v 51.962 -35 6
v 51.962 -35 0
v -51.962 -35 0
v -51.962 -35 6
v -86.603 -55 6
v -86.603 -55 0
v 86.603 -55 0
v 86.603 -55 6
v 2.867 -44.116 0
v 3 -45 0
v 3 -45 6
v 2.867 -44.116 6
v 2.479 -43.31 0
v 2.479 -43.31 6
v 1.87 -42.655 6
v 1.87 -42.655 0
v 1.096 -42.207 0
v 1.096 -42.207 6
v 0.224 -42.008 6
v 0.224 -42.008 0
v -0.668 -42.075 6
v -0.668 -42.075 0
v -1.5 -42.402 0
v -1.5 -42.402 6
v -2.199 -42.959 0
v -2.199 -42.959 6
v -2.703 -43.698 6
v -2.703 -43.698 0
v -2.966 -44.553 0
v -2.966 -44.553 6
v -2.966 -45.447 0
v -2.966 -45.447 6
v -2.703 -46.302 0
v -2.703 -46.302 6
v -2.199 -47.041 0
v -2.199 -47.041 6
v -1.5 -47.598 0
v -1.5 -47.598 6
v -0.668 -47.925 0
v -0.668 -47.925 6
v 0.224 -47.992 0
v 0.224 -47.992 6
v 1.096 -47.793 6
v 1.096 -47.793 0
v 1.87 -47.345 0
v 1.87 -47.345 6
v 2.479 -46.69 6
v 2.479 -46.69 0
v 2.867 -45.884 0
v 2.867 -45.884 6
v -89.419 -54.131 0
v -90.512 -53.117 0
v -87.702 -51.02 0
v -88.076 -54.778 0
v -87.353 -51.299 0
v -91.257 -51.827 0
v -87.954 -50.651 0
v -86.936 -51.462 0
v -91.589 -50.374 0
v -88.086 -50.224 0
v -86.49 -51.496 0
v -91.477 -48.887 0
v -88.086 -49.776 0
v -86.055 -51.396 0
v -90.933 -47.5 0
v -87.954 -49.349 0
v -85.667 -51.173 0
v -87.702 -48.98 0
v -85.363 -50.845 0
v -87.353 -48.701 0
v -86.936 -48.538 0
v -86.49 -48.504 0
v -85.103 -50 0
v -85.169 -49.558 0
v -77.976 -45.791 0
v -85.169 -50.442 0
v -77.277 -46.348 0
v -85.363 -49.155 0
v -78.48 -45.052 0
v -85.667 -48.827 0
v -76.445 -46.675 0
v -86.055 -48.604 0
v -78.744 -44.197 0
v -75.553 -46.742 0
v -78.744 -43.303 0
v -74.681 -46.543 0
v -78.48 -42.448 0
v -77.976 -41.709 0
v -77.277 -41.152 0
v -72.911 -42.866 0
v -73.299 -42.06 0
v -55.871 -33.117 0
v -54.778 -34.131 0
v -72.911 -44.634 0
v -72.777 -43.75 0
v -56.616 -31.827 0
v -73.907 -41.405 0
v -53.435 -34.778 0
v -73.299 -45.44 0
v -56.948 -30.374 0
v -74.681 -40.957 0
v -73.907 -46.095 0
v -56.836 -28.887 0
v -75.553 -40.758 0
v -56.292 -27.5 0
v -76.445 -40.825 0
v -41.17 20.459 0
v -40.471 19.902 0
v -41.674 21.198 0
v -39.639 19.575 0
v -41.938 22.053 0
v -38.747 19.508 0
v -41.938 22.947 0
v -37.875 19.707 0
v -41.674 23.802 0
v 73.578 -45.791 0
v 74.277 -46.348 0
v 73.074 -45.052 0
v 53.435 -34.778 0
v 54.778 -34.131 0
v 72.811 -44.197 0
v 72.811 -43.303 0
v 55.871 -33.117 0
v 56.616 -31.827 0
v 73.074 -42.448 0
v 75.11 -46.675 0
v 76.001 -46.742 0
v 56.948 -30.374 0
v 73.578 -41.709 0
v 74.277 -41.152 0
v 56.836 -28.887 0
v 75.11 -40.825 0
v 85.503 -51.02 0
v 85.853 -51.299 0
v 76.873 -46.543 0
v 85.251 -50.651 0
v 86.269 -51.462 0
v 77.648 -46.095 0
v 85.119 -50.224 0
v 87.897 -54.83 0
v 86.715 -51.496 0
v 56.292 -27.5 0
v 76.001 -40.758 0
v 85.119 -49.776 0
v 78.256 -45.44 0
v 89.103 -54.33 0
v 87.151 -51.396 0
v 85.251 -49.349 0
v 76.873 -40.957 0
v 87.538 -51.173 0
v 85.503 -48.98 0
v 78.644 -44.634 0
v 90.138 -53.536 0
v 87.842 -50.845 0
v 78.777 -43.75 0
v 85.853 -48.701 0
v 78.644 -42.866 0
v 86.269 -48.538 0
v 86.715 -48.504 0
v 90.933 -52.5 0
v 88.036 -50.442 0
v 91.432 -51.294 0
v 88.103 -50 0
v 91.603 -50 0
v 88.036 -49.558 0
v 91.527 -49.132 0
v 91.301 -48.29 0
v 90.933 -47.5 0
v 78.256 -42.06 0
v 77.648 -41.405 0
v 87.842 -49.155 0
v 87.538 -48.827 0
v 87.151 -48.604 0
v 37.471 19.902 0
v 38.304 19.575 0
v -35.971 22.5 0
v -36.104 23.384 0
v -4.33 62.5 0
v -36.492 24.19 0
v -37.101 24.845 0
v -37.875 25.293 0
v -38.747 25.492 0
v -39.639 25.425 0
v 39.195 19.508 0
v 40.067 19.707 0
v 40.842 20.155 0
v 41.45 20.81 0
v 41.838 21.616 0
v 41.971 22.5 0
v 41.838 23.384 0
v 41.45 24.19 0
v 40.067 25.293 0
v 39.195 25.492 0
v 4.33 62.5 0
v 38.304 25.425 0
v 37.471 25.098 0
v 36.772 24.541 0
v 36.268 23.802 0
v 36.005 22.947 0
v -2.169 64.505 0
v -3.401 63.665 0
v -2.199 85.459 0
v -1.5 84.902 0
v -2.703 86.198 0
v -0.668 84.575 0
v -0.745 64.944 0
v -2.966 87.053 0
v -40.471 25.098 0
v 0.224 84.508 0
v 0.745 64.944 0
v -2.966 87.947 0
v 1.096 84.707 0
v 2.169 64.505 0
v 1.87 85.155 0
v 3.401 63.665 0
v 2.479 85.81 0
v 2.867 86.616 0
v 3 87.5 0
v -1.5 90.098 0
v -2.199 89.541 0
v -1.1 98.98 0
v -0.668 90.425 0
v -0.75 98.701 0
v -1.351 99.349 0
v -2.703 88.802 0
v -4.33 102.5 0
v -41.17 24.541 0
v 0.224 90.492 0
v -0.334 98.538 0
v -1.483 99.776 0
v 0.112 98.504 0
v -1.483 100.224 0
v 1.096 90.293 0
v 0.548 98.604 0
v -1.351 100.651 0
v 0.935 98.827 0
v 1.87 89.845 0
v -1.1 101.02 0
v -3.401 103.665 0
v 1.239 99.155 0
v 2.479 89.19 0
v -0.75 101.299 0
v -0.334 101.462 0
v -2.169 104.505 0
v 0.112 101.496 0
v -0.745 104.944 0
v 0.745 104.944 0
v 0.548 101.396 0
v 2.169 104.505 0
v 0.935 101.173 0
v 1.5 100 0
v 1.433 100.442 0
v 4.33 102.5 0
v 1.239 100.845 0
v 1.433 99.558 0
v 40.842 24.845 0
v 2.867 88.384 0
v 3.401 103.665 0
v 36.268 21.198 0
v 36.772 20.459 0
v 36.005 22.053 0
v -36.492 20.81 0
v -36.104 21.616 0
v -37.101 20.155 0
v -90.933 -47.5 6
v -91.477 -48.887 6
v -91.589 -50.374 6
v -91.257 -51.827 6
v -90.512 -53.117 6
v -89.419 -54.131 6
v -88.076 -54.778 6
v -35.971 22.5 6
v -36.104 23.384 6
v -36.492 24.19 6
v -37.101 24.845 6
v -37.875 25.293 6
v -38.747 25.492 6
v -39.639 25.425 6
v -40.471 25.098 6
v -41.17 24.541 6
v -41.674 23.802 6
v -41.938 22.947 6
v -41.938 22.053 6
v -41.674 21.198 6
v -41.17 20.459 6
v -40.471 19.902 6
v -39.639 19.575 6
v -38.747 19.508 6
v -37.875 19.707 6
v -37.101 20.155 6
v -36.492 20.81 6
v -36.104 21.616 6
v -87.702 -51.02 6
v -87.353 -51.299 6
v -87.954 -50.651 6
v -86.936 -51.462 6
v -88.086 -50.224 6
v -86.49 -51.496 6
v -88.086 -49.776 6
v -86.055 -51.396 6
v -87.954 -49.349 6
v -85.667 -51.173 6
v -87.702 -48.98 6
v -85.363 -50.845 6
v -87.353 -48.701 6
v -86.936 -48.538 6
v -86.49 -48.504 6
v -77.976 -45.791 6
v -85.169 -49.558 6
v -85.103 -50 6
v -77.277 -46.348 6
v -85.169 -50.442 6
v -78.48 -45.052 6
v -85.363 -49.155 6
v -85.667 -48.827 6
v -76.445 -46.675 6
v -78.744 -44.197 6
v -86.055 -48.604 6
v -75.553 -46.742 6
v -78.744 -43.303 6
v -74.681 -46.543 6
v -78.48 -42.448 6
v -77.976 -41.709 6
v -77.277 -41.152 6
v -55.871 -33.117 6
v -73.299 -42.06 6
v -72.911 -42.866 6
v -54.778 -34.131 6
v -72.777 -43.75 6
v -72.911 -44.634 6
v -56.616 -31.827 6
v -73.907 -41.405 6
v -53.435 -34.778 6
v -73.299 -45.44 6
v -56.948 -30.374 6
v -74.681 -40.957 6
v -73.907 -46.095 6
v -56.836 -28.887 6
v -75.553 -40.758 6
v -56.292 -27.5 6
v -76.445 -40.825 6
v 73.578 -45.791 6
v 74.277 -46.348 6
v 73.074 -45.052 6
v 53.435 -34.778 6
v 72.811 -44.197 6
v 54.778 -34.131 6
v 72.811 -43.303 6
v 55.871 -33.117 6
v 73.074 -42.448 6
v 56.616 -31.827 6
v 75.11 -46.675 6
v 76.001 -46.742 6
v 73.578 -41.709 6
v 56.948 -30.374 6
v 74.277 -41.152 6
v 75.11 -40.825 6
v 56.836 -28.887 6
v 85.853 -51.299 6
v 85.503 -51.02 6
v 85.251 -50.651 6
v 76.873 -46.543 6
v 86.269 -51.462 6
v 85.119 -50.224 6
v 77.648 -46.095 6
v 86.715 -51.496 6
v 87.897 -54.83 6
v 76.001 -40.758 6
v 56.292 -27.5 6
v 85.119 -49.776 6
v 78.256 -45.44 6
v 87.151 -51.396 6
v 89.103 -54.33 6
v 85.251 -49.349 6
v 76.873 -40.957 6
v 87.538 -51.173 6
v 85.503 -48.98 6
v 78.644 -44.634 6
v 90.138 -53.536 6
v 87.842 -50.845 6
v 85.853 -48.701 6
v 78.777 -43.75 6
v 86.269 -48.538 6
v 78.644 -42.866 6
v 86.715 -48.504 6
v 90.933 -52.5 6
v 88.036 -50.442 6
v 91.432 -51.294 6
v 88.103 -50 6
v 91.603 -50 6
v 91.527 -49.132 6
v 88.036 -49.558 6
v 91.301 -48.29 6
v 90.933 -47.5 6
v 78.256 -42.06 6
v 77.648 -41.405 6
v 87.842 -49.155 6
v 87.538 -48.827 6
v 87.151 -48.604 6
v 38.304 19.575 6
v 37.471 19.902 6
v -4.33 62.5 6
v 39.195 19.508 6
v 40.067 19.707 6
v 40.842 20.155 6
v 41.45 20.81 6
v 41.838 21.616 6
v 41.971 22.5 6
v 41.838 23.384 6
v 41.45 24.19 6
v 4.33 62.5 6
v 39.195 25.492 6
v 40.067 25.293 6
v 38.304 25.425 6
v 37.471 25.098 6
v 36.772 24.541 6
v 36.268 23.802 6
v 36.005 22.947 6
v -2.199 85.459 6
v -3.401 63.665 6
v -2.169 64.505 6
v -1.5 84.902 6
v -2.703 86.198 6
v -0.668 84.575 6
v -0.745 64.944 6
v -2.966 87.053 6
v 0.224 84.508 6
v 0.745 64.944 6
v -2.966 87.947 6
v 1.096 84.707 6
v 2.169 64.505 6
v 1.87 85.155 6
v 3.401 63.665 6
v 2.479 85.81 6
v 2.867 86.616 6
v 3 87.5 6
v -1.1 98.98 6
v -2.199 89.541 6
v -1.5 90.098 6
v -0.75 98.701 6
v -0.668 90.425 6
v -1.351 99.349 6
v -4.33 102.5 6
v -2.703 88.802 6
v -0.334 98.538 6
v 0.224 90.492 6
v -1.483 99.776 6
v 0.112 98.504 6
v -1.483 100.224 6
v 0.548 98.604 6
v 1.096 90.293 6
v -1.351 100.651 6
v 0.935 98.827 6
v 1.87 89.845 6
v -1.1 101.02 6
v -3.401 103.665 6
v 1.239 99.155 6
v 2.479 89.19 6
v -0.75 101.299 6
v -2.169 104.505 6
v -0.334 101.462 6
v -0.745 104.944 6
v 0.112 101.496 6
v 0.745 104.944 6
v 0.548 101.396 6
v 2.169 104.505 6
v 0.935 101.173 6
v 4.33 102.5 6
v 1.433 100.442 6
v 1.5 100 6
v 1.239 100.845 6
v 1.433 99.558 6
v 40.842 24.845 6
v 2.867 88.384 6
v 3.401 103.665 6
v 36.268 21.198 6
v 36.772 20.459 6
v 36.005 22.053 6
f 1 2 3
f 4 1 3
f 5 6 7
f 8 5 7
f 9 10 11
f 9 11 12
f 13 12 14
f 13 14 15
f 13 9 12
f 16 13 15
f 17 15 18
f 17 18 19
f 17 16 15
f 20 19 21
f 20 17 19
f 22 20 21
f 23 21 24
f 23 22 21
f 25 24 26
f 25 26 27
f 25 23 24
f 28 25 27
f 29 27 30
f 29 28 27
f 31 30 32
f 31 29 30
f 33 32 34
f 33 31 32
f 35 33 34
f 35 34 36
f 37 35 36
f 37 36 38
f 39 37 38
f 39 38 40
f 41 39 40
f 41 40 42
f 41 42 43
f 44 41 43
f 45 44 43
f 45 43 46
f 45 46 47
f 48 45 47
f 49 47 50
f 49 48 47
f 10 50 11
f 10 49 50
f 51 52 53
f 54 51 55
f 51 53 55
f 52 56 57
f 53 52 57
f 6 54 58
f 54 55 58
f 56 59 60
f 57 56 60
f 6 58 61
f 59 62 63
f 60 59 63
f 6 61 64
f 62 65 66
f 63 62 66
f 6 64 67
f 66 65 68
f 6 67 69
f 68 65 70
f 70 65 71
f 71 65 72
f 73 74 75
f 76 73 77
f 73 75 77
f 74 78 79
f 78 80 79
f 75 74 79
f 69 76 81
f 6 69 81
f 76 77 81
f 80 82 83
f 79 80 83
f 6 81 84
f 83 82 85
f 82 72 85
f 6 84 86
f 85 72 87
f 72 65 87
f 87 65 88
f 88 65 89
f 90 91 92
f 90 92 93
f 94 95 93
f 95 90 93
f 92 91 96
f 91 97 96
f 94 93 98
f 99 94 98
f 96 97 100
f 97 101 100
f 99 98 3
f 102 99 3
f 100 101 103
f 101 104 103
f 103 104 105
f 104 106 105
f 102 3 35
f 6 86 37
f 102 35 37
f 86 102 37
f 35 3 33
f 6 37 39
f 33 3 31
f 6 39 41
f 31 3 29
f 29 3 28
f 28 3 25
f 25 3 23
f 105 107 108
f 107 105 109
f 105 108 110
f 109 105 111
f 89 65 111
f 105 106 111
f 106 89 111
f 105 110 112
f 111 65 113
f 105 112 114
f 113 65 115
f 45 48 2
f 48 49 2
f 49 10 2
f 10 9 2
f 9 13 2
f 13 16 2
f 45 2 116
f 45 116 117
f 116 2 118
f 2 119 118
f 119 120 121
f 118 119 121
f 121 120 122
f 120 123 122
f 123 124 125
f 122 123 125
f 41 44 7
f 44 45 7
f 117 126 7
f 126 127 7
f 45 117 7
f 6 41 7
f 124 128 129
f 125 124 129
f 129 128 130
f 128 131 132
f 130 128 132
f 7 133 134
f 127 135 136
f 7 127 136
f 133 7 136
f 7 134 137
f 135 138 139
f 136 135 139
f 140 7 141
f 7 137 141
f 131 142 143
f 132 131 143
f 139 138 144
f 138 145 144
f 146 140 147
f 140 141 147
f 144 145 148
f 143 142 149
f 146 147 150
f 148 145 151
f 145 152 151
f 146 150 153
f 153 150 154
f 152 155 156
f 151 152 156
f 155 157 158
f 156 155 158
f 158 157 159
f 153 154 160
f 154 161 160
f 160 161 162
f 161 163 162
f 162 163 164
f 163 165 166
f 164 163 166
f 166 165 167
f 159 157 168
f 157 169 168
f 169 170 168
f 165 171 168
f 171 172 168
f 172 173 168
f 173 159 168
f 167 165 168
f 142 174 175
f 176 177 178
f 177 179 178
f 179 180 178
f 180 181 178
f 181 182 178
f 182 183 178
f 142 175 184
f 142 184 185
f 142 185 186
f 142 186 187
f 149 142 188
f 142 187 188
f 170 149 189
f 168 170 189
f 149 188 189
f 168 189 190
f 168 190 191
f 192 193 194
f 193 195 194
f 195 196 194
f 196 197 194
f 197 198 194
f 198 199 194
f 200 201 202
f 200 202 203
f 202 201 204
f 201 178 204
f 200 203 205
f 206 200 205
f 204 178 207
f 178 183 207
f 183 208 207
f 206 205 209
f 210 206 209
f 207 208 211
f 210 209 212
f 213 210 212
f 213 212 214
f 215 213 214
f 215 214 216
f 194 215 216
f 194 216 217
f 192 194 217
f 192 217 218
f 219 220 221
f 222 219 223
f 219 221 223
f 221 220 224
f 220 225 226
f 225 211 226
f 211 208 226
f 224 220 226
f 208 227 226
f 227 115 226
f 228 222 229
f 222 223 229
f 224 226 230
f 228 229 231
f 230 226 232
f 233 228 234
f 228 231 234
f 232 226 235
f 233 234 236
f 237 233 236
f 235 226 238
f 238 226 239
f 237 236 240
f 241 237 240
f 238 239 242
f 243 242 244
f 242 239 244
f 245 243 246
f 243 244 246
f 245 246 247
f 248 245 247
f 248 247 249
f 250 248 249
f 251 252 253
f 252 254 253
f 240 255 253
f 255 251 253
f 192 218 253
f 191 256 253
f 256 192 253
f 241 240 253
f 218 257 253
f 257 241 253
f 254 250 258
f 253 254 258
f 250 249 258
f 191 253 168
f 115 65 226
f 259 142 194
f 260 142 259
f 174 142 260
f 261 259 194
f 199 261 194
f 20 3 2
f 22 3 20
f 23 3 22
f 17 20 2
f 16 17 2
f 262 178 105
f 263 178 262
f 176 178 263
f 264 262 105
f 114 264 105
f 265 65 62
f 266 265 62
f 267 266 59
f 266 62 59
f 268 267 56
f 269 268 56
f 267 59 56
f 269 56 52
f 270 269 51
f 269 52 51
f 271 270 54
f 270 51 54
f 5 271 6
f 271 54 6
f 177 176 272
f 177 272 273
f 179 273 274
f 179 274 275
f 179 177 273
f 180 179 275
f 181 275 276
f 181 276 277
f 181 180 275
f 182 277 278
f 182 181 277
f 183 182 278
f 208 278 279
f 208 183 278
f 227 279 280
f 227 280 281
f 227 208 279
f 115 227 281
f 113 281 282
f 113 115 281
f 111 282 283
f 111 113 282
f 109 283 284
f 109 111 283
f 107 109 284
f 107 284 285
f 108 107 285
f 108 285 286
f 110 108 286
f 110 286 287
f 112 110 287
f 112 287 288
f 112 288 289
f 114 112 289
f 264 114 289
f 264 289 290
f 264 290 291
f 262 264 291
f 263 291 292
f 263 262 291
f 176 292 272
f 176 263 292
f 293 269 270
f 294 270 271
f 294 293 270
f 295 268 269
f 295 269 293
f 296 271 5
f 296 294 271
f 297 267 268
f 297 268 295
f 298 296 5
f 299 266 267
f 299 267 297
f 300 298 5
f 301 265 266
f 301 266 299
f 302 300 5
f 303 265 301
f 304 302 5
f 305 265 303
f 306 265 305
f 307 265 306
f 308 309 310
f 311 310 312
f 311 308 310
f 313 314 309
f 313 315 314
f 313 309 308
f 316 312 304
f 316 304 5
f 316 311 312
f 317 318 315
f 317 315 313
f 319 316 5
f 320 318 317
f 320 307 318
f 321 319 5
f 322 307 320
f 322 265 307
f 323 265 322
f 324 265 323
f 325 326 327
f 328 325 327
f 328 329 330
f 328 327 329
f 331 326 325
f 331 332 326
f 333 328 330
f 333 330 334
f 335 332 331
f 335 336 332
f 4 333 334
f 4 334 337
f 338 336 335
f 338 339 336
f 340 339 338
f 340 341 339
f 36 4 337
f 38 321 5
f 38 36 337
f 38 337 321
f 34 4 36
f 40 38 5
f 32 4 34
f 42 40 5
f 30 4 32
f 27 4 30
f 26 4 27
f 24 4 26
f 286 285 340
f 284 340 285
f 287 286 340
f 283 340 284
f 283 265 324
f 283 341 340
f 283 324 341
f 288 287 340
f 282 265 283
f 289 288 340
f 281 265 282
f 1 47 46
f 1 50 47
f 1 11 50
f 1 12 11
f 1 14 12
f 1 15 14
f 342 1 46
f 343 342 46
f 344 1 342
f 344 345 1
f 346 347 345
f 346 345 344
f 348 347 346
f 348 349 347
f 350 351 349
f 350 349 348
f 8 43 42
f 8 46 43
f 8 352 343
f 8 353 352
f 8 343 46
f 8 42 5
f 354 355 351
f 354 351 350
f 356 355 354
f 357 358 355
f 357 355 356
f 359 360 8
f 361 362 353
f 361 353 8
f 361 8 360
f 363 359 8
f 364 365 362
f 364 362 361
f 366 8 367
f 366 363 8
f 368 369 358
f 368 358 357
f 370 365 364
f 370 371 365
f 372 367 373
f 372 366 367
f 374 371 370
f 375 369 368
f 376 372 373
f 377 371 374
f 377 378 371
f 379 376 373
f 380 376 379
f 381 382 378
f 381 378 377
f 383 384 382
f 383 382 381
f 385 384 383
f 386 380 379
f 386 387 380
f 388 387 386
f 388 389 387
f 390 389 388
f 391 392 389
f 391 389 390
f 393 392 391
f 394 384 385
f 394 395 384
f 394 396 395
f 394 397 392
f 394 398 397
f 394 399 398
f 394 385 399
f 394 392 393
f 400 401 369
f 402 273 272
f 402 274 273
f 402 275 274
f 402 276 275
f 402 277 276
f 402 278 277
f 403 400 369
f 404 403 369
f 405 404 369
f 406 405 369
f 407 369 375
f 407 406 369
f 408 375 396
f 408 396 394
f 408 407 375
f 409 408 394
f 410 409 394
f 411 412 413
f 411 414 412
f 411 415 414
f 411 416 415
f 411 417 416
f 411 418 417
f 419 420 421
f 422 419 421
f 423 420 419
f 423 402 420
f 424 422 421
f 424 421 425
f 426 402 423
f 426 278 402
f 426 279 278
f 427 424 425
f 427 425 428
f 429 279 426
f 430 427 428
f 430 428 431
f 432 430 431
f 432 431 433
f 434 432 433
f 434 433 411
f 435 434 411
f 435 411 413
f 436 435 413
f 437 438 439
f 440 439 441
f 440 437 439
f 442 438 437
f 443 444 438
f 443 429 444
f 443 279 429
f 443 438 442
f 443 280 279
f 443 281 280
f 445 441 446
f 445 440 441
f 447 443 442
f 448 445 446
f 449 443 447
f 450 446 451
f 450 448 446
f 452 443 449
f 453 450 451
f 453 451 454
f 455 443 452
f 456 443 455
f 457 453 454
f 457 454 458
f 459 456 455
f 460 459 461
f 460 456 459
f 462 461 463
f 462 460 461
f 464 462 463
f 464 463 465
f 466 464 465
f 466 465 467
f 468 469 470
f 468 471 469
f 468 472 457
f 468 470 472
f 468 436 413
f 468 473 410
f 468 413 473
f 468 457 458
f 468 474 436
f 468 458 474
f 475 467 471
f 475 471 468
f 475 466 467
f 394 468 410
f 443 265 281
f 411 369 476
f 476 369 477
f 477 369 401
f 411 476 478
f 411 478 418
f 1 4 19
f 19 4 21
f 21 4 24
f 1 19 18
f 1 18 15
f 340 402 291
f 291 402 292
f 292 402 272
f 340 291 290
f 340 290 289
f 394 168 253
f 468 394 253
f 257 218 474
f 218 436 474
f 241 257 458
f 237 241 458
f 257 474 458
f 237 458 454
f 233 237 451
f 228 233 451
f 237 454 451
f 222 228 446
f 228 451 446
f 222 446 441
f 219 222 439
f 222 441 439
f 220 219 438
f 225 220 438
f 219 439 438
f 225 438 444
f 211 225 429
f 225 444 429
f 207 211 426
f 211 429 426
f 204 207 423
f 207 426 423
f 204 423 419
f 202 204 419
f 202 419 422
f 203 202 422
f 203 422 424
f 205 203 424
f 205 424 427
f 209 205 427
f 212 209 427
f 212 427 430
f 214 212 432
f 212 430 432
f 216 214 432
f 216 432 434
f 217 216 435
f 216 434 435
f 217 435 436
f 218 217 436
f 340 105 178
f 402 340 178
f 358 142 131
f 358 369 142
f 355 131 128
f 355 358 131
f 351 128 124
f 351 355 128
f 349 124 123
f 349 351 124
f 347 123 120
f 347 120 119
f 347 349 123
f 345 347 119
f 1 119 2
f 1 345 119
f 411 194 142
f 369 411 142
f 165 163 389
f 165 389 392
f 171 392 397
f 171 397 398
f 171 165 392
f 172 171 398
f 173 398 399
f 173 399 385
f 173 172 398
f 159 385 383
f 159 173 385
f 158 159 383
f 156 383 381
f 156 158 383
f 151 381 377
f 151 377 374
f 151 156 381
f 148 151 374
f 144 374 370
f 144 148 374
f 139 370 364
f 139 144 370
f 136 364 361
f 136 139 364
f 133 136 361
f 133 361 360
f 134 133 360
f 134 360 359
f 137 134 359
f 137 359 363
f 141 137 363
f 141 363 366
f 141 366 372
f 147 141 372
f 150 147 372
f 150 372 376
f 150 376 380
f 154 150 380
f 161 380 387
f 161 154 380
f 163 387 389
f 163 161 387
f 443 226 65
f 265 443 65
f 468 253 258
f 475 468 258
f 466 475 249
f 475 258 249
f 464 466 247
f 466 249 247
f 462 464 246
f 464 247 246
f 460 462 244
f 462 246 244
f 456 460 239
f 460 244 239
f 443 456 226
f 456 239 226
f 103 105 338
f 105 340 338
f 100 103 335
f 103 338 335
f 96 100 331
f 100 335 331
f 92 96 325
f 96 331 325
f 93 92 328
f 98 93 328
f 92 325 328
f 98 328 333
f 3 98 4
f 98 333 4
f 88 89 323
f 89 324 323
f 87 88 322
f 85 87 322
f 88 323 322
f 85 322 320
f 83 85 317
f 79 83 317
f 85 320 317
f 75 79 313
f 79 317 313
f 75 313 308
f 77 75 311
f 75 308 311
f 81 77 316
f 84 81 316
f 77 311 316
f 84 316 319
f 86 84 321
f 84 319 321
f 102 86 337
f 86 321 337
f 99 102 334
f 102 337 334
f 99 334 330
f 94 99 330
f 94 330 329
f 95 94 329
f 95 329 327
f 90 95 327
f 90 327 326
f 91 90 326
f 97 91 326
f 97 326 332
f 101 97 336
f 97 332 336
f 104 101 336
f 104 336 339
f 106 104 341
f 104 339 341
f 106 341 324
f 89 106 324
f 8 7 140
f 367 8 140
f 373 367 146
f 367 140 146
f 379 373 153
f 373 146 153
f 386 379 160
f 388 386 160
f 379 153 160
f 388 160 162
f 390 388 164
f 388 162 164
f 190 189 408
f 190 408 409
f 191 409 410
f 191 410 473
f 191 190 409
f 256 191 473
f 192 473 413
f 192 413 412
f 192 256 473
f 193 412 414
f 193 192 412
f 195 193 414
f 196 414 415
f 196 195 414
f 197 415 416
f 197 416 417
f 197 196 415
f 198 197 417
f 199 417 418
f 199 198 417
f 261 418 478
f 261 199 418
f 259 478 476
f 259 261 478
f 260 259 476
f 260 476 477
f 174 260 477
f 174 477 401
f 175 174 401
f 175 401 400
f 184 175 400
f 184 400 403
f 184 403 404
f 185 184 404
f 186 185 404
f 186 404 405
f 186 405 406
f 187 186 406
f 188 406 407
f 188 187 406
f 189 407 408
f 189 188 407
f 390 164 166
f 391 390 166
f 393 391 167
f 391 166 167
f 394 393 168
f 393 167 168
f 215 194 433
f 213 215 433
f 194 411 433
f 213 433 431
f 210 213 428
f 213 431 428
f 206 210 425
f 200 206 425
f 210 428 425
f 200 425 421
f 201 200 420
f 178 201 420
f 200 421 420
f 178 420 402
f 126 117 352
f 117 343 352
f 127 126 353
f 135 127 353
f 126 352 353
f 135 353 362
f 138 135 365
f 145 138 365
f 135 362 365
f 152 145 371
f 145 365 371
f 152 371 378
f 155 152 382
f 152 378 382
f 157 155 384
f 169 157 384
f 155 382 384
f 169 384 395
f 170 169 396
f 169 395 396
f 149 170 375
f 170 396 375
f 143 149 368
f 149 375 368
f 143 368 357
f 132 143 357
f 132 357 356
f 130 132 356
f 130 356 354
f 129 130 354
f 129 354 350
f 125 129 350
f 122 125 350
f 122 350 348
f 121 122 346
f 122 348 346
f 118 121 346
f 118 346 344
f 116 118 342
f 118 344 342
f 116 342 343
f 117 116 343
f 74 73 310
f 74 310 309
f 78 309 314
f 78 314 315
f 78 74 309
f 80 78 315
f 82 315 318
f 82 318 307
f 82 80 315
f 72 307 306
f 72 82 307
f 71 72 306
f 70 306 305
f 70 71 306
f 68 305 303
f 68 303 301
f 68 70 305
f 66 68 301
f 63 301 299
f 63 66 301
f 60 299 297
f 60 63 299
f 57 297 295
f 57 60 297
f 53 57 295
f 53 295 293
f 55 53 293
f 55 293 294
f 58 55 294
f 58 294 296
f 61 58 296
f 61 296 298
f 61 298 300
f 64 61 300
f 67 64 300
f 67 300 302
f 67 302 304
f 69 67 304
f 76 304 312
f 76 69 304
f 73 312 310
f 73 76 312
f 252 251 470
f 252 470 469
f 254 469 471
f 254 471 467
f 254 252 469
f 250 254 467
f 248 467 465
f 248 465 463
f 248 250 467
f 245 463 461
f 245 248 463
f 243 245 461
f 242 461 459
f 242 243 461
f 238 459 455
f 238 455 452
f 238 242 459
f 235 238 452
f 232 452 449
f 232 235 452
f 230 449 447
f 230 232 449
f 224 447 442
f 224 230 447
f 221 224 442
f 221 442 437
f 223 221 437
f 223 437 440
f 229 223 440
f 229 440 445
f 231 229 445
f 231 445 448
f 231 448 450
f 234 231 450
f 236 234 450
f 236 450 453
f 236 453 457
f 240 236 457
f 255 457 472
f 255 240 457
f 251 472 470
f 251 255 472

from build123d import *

# Parameters (mm, degrees)
F1_R            = 3
F1_R_2          = 1.5
F2_DEPTH        = 6
F3_R            = 5
F4_R            = 3
F5_DEPTH        = 12.5
F5_COPIES_COUNT = 3


# Not quite as in the source:
# - a pattern or mirror of a feature is missing from the dataset's text; its kind, count and spacing are read off the source's solid


with BuildPart() as f2:
    # F1 (on Top) → F2 (new body)
    with BuildSketch(Plane.XY):
        with BuildLine():
            ThreePointArc((4.3301270189, 102.5), (4.8296291314, 101.2940952255), (5, 100))
            ThreePointArc((5, 100), (-1.2940952255, 95.1703708686), (-4.3301270189, 102.5))
            Line((-4.3301270189, 102.5), (-90.9326673974, -47.5))
            ThreePointArc((-90.9326673974, -47.5), (-85.3084451529, -45.1703708686), (-81.6025403784, -50))
            ThreePointArc((-81.6025403784, -50), (-83.0670064725, -53.5355339059), (-86.6025403784, -55))
            Line((-86.6025403784, -55), (86.6025403784, -55))
            ThreePointArc((86.6025403784, -55), (82.2724133595, -47.5), (90.9326673974, -47.5))
            Line((90.9326673974, -47.5), (4.3301270189, 102.5))
        make_face()
        with Locations((-38.9711431703, 22.5)):
            Circle(F1_R, mode=Mode.SUBTRACT)
        with Locations((0, -45)):
            Circle(F1_R, mode=Mode.SUBTRACT)
        Polygon((60.6217782649, -35), (-60.6217782649, -35), (0, 70), align=None, mode=Mode.SUBTRACT)
        with Locations((38.9711431703, 22.5)):
            Circle(F1_R, mode=Mode.SUBTRACT)
        with BuildLine():
            ThreePointArc((91.6025403784, -50), (91.4321695099, -48.7059047745), (90.9326673974, -47.5))
            ThreePointArc((90.9326673974, -47.5), (82.2724133595, -47.5), (86.6025403784, -55))
            ThreePointArc((86.6025403784, -55), (90.1380742844, -53.5355339059), (91.6025403784, -50))
        make_face()
        with Locations((86.6025403784, -50)):
            Circle(F1_R_2, mode=Mode.SUBTRACT)
        with BuildLine():
            ThreePointArc((-81.6025403784, -50), (-85.3084451529, -45.1703708686), (-90.9326673974, -47.5))
            ThreePointArc((-90.9326673974, -47.5), (-90.9326673974, -52.5), (-86.6025403784, -55))
            ThreePointArc((-86.6025403784, -55), (-83.0670064725, -53.5355339059), (-81.6025403784, -50))
        make_face()
        with Locations((-86.6025403784, -50)):
            Circle(F1_R_2, mode=Mode.SUBTRACT)
        with BuildLine():
            ThreePointArc((-4.3301270189, 102.5), (-1.2940952255, 95.1703708686), (5, 100))
            ThreePointArc((5, 100), (4.8296291314, 101.2940952255), (4.3301270189, 102.5))
            ThreePointArc((4.3301270189, 102.5), (0, 105), (-4.3301270189, 102.5))
        make_face()
        with Locations((0, 100)):
            Circle(F1_R_2, mode=Mode.SUBTRACT)
    extrude(amount=F2_DEPTH)

    # F3
    f3_edges = [f2.edges().sort_by_distance(p)[0] for p in [
        (0, 70, 3),
        (-60.621778, -35, 3),
        (60.621778, -35, 3),
    ]]
    fillet(f3_edges, radius=F3_R)

    # F4 (on Top) → F5 (cut, symmetric)
    with BuildSketch(Plane.XY):
        with Locations((0, 87.5)):
            Circle(F4_R)
    f5 = extrude(amount=F5_DEPTH, both=True, mode=Mode.SUBTRACT)

    # F5_copies: F5 ×3 about axis
    f5_copies_axis = Axis((0, 0, 0), (0, 0, 1))
    for i in range(1, F5_COPIES_COUNT):
        add(f5.rotate(f5_copies_axis, i * 360 / F5_COPIES_COUNT), mode=Mode.SUBTRACT)


solid = f2.part
